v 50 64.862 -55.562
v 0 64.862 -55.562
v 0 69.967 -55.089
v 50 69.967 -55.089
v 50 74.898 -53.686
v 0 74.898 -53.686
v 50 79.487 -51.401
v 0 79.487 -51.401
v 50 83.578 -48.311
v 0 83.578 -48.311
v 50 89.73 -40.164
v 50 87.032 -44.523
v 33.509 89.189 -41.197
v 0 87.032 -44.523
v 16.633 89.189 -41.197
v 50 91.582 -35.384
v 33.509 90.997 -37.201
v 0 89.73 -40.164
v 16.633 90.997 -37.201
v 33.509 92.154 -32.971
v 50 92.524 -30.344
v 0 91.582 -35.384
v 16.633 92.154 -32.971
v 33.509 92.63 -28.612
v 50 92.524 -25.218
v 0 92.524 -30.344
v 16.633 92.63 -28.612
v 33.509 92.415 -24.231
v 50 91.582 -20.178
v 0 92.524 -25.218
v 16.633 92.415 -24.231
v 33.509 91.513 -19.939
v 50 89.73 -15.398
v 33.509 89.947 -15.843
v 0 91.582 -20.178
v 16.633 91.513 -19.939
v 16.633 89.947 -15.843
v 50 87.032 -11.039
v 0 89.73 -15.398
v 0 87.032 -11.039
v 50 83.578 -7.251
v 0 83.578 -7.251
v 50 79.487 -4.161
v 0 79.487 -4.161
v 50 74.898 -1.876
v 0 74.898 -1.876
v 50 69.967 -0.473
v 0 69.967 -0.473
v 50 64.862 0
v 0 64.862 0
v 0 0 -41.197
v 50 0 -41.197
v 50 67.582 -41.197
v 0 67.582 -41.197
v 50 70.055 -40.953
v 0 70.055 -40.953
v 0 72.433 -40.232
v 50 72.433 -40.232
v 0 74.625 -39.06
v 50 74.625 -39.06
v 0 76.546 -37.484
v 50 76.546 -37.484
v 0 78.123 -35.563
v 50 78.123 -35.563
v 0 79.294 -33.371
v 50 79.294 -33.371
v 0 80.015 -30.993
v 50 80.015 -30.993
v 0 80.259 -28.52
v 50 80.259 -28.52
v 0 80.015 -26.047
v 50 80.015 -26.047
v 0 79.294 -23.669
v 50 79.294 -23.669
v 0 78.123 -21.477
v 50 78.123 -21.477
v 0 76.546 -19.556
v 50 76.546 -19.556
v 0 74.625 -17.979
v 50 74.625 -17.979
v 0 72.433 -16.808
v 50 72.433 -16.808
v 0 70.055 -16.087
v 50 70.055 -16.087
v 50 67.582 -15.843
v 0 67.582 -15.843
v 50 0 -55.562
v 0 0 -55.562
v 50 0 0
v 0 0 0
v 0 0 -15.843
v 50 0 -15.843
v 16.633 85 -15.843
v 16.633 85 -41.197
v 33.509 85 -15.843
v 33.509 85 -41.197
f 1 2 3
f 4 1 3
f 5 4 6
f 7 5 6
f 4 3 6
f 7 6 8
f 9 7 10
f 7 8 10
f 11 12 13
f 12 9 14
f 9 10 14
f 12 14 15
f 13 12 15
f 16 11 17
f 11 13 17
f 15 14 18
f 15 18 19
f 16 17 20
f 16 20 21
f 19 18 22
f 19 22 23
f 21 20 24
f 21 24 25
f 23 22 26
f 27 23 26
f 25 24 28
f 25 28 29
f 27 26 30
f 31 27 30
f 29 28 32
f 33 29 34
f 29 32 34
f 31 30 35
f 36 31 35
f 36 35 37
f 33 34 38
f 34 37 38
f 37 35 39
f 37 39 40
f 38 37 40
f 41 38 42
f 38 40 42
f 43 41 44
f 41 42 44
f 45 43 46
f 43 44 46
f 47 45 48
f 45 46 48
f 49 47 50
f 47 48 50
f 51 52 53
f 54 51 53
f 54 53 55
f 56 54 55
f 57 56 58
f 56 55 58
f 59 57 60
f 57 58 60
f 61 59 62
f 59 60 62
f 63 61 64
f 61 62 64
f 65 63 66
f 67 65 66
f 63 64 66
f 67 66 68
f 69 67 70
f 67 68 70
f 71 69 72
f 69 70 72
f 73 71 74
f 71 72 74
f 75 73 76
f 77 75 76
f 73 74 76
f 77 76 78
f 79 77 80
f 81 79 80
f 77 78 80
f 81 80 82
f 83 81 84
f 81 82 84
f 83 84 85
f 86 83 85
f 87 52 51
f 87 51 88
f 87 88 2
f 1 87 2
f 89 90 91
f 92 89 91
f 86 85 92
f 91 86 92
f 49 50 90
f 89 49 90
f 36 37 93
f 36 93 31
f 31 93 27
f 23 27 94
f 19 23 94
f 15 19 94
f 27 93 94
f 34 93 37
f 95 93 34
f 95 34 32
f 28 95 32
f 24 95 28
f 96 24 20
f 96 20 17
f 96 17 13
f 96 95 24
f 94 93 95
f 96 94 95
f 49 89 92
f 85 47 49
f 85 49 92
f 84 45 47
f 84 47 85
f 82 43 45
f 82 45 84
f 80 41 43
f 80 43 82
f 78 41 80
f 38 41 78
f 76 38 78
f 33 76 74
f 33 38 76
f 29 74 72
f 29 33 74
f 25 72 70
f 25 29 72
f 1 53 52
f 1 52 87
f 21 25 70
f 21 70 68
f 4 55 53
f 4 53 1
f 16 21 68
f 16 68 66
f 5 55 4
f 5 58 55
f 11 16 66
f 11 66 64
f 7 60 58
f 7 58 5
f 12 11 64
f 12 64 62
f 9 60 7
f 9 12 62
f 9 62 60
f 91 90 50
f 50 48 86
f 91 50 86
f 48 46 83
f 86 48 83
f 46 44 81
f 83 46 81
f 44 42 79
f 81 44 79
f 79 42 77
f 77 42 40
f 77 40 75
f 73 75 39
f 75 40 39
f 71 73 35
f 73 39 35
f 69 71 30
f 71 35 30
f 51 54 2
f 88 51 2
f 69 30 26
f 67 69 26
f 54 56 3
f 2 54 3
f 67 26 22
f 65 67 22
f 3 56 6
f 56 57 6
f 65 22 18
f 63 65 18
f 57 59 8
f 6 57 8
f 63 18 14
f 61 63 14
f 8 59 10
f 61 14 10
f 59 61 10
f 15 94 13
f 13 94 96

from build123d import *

# Parameters (mm, degrees)
BOSS_EXTRUDE3_DEPTH = 50
CUT_EXTRUDE2_DEPTH  = 120.036992567
SKETCH12_W          = 16.875844183
SKETCH12_H          = 25.353739704
CUT_EXTRUDE3_DEPTH  = 114.190623836


with BuildPart() as part:
    # Sketch7 → Boss-Extrude3 (new body)
    with BuildSketch(Plane(origin=(0, 0, 0), x_dir=(0, 0, -1), z_dir=(1, 0, 0))):
        with BuildLine():
            ThreePointArc((55.561833342, 64.861882699), (27.780916671, 92.64279937), (0, 64.861882699))
            Line((0, 64.861882699), (55.561833342, 64.861882699))
        make_face()
        with BuildLine():
            Line((55.561833342, 64.861882699), (0, 64.861882699))
            ThreePointArc((0, 64.861882699), (27.780916671, 37.080966028), (55.561833342, 64.861882699))
        make_face()
        with BuildLine():
            Line((0, 64.861882699), (0, 0))
            Line((0, 0), (55.561833342, 0))
            Line((55.561833342, 0), (55.561833342, 64.861882699))
            ThreePointArc((55.561833342, 64.861882699), (27.780916671, 37.080966028), (0, 64.861882699))
        make_face()
    extrude(amount=BOSS_EXTRUDE3_DEPTH)

    # Sketch8 → Cut-Extrude2 (cut, through all)
    with BuildSketch(Plane(origin=(50, 0, 0), x_dir=(0, 0, -1), z_dir=(1, 0, 0))):
        with BuildLine():
            ThreePointArc((41.196796873, 67.582158988), (28.519927021, 80.25902884), (15.843057169, 67.582158988))
            Line((15.843057169, 67.582158988), (41.196796873, 67.582158988))
        make_face()
        with BuildLine():
            Line((41.196796873, 67.582158988), (15.843057169, 67.582158988))
            ThreePointArc((15.843057169, 67.582158988), (28.519927021, 54.905289136), (41.196796873, 67.582158988))
        make_face()
        with BuildLine():
            ThreePointArc((41.196796873, 67.582158988), (28.519927021, 54.905289136), (15.843057169, 67.582158988))
            Line((15.843057169, 67.582158988), (15.843057169, 0))
            Line((15.843057169, 0), (41.196796873, 0))
            Line((41.196796873, 0), (41.196796873, 67.582158988))
        make_face()
    extrude(amount=-CUT_EXTRUDE2_DEPTH, mode=Mode.SUBTRACT)

    # Sketch12 → Cut-Extrude3 (cut, through all)
    with BuildSketch(Plane(origin=(0, 85, 0), x_dir=(1, 0, 0), z_dir=(0, 1, 0))):
        with Locations((25.070624904, 28.519927021)):
            Rectangle(SKETCH12_W, SKETCH12_H)
    extrude(amount=CUT_EXTRUDE3_DEPTH, mode=Mode.SUBTRACT)


solid = part.part
